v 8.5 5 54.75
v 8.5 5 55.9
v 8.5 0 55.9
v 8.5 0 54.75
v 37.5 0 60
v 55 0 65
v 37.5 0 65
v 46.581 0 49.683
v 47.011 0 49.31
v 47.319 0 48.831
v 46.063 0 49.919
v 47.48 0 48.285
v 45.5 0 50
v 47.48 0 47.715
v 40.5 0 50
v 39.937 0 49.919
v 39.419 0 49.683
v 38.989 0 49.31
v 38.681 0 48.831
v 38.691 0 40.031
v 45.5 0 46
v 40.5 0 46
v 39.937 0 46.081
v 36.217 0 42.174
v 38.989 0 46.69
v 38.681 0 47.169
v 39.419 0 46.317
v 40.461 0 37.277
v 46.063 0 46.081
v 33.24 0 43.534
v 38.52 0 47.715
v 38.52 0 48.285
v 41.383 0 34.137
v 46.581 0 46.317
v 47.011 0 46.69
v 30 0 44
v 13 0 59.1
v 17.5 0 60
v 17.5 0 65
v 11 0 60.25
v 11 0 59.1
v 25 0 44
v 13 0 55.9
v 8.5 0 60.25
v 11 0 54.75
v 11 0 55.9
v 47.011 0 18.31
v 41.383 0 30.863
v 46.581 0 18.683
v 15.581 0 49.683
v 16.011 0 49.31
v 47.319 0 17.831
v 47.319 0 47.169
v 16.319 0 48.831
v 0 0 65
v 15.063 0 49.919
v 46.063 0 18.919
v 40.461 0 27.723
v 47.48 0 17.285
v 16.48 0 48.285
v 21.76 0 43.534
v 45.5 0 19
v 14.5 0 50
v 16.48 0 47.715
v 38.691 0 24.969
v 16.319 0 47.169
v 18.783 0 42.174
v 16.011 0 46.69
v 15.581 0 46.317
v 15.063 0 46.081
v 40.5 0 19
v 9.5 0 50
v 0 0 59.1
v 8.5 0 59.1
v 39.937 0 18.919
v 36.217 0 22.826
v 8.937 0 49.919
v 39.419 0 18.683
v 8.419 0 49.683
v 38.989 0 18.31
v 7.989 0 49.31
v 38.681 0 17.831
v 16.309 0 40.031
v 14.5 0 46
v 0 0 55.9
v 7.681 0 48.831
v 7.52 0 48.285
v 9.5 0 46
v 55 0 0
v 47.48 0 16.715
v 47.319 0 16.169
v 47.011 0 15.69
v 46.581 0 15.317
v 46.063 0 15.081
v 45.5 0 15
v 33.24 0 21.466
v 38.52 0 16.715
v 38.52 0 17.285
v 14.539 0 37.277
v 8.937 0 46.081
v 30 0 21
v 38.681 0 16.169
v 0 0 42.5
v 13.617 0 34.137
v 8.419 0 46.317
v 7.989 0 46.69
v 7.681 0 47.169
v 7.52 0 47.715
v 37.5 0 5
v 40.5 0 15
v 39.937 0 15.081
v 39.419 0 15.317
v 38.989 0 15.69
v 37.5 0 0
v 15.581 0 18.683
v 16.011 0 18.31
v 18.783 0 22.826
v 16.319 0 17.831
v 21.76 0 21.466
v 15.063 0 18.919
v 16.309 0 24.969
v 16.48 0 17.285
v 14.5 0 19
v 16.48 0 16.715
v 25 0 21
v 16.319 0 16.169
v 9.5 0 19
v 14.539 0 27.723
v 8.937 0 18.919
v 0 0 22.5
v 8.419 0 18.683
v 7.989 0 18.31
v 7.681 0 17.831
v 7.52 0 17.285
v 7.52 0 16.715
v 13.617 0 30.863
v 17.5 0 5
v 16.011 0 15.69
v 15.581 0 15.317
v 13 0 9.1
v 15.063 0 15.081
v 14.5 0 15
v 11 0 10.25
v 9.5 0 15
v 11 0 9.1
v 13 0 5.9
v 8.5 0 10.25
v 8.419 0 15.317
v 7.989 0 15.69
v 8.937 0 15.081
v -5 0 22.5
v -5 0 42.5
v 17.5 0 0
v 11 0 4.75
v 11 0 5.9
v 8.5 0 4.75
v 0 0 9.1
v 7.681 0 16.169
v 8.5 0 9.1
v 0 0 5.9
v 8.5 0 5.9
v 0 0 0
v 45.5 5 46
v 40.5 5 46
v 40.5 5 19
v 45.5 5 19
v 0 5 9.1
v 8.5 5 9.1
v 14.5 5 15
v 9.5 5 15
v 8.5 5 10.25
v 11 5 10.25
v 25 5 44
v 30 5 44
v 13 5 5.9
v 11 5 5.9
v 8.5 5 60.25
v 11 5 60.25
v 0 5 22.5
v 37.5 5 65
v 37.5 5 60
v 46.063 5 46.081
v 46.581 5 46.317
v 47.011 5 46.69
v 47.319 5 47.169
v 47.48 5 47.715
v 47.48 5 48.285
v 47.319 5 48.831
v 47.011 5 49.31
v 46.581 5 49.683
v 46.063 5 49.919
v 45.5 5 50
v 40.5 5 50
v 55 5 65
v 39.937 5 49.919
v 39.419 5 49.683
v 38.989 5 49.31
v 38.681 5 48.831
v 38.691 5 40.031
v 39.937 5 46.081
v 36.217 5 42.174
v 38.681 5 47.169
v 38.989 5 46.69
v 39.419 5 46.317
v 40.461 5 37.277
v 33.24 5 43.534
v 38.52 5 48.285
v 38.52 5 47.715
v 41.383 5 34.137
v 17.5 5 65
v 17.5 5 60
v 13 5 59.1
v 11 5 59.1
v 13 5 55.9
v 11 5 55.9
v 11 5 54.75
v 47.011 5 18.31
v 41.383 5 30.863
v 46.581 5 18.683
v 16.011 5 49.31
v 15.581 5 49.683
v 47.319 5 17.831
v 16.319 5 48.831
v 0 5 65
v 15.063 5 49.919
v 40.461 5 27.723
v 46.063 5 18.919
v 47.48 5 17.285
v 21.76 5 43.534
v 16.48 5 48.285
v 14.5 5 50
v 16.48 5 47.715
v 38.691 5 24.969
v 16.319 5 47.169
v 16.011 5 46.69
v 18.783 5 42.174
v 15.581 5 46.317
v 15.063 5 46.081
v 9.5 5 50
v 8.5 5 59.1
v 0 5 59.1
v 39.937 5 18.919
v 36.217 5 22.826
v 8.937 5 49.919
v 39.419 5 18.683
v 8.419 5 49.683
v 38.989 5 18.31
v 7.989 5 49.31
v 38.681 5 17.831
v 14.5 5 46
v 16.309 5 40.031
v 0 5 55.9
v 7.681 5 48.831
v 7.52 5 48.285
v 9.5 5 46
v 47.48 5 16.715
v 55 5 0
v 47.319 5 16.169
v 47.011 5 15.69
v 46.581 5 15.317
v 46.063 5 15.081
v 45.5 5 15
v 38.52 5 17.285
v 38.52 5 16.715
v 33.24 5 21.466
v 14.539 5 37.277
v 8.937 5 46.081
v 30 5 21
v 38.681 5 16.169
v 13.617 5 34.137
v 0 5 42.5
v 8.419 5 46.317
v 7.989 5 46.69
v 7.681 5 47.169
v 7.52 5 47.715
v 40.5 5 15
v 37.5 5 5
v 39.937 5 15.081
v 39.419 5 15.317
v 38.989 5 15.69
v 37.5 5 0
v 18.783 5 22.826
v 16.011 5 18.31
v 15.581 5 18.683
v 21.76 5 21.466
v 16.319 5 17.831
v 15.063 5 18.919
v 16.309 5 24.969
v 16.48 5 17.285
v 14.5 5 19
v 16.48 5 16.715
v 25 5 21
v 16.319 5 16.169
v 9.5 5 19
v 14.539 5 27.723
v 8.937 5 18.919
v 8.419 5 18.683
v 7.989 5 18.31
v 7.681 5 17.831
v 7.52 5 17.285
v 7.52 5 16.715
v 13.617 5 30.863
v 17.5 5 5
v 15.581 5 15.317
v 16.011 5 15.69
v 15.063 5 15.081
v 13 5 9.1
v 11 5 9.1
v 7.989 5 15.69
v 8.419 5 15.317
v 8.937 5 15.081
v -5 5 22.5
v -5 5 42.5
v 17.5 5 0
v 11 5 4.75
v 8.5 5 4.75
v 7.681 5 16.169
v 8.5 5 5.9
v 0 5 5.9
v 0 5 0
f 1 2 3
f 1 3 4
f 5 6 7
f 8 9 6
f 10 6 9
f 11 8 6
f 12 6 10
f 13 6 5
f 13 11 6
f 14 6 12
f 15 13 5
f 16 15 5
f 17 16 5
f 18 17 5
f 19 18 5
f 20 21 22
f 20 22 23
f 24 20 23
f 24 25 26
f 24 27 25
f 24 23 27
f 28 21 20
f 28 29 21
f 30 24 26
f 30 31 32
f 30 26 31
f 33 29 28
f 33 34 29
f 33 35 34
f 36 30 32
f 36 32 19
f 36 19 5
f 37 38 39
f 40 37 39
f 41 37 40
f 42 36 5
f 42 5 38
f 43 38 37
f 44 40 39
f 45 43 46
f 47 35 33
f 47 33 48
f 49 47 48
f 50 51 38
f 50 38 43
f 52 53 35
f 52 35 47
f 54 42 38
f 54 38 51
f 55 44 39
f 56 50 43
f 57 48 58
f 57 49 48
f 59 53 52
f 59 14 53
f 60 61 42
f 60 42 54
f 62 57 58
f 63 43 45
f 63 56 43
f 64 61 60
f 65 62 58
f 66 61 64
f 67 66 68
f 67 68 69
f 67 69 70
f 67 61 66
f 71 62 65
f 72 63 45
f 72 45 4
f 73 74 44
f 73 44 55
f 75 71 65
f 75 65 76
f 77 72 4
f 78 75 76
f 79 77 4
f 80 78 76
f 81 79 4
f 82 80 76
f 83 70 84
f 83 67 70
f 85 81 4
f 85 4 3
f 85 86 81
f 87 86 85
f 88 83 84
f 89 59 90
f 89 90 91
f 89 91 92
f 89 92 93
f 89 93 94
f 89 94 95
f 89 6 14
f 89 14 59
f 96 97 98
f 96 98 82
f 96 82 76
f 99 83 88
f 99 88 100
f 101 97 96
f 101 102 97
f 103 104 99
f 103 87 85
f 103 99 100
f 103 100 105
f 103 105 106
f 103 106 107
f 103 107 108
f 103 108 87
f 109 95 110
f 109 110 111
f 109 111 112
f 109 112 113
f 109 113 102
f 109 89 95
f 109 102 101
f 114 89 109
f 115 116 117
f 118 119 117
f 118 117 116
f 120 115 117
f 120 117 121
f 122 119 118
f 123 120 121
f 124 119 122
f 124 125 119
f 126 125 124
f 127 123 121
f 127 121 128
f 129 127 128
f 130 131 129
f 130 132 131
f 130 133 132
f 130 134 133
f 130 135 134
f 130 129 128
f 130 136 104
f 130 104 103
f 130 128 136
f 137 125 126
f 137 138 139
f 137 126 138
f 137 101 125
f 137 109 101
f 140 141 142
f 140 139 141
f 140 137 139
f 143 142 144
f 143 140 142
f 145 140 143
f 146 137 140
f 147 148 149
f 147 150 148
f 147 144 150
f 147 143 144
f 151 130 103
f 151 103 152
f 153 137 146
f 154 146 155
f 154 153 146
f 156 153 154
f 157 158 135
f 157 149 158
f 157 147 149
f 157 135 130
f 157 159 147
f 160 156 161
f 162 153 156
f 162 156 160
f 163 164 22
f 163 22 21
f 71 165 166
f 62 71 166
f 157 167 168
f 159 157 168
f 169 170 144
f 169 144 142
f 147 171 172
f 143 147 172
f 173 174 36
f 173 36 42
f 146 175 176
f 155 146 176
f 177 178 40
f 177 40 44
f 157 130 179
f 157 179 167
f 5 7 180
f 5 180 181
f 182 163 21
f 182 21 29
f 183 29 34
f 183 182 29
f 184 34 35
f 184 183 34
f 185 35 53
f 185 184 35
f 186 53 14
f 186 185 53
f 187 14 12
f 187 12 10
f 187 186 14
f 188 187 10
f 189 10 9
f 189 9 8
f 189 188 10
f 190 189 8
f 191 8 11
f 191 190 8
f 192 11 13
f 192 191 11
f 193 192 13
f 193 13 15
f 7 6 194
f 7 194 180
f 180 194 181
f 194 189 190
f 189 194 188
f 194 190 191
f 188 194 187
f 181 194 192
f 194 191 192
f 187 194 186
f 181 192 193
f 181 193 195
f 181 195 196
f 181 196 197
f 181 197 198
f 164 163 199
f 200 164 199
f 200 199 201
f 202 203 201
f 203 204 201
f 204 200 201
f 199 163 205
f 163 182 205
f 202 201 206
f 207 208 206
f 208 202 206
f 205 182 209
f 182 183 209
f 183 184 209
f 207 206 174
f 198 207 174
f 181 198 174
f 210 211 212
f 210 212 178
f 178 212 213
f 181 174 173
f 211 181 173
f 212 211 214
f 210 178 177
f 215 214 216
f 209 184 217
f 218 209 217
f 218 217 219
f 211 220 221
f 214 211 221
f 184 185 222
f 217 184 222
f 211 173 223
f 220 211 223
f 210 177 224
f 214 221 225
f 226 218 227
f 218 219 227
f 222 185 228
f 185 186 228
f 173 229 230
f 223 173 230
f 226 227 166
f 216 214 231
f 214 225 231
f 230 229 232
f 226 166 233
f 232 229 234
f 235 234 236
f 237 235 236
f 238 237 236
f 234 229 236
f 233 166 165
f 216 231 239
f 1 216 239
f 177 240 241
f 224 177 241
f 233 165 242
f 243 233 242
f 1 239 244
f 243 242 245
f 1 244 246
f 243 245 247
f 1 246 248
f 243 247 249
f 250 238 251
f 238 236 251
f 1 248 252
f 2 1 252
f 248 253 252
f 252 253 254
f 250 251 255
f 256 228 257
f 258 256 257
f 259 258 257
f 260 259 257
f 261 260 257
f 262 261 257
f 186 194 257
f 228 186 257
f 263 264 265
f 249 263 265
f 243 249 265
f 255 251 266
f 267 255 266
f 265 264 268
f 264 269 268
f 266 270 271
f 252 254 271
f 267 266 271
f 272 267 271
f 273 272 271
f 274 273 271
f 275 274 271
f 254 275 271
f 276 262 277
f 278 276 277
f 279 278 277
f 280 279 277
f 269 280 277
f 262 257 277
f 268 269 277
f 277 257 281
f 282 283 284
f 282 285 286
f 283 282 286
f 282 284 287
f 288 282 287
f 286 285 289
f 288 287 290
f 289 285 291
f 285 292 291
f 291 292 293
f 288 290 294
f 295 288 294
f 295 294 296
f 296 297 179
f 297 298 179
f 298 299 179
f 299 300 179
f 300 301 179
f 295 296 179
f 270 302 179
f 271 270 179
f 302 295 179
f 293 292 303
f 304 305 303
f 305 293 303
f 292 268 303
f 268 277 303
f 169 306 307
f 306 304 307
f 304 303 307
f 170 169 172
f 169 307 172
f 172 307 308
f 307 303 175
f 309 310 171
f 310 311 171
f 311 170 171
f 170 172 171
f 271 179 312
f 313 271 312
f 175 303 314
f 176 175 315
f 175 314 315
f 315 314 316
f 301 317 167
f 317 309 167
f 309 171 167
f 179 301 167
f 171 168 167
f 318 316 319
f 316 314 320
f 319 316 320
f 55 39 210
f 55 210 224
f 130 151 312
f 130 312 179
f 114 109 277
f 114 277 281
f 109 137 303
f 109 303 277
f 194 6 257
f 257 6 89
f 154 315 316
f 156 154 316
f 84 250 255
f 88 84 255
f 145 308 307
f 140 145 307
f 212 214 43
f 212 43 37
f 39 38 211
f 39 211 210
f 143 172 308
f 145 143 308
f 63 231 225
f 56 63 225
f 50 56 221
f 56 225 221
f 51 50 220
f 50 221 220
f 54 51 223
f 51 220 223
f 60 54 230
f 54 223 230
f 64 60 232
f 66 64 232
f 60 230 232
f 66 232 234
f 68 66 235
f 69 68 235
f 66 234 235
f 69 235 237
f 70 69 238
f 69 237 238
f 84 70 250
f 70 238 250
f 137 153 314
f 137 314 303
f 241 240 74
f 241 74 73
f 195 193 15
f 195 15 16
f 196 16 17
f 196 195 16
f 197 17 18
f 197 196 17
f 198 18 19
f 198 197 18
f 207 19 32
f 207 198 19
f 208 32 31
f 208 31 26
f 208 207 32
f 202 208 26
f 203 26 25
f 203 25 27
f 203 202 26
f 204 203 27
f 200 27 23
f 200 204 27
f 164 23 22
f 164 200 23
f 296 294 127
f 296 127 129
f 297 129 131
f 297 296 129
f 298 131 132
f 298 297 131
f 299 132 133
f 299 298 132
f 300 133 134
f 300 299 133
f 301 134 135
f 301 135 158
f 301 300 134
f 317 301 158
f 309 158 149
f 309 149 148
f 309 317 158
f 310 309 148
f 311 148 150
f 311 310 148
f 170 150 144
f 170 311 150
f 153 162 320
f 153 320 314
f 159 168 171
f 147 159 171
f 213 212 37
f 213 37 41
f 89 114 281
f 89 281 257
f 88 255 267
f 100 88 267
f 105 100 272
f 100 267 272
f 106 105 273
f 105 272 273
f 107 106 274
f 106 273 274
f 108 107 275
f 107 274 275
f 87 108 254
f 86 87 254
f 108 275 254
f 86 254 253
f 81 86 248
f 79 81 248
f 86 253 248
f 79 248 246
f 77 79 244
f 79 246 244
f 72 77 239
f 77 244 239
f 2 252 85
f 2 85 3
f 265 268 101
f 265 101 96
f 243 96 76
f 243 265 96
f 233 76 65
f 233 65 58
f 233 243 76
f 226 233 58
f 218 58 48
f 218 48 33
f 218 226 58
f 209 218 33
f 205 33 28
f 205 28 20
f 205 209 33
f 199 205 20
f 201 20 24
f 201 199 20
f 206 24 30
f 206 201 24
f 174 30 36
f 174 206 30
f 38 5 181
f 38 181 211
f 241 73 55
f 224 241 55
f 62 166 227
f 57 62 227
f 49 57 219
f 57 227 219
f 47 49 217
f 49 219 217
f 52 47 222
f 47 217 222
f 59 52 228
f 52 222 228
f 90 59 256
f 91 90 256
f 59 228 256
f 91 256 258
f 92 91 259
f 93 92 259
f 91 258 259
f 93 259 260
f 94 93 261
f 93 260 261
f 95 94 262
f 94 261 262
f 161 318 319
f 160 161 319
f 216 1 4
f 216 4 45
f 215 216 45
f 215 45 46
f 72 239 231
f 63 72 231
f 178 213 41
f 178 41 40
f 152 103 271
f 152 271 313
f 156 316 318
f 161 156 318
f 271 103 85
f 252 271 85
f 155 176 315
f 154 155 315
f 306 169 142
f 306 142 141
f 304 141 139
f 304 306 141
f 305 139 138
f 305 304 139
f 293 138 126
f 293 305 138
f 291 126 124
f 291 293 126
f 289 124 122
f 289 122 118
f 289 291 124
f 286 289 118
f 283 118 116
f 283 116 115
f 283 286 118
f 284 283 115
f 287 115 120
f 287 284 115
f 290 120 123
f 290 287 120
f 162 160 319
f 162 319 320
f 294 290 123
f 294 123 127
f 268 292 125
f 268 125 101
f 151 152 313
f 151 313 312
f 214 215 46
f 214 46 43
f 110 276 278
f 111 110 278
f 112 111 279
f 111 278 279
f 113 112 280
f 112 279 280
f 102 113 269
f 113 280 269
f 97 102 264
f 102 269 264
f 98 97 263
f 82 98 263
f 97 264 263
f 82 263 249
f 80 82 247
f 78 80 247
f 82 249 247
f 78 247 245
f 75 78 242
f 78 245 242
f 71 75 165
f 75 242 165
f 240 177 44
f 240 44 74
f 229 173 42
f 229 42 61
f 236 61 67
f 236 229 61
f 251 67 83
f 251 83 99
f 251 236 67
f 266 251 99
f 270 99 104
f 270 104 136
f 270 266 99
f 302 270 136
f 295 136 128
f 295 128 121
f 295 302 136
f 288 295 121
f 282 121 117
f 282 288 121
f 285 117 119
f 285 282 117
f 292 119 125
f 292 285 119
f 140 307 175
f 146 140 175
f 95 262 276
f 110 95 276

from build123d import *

# Parameters (mm, degrees)
BOSS_EXTRU_1_DEPTH      = 5
ENL_V_MAT_EXTRU_1_DEPTH = 5
ENL_V_MAT_EXTRU_2_DEPTH = 5
SYM_TRIE2_COPY_1_DEPTH  = 5
ENL_V_MAT_EXTRU_3_DEPTH = 10


with BuildPart() as part:
    # Esquisse1 → Boss.-Extru.1 (new body)
    with BuildSketch(Plane(origin=(0, 0, 0), x_dir=(1, 0, 0), z_dir=(0, 1, 0))):
        Polygon((17.5, -5), (37.5, -5), (37.5, 0), (55, 0), (55, -60), (55, -65), (37.5, -65), (37.5, -60), (17.5, -60), (17.5, -65), (0, -65), (0, -60), (0, -42.5), (-5, -42.5), (-5, -22.5), (0, -22.5), (0, 0), (17.5, 0), align=None)
    extrude(amount=BOSS_EXTRU_1_DEPTH)

    # Esquisse2 → Enlèv. mat.-Extru.1 (cut)
    with BuildSketch(Plane(origin=(0, 5, 0), x_dir=(1, 0, 0), z_dir=(0, 1, 0))):
        with BuildLine():
            Line((25, -21), (30, -21))
            ThreePointArc((30, -21), (41.5, -32.5), (30, -44))
            Line((30, -44), (25, -44))
            ThreePointArc((25, -44), (13.5, -32.5), (25, -21))
        make_face()
    extrude(amount=-ENL_V_MAT_EXTRU_1_DEPTH, mode=Mode.SUBTRACT)

    # Esquisse3 → Enlèv. mat.-Extru.2 (cut)
    with BuildSketch(Plane(origin=(0, 5, 0), x_dir=(1, 0, 0), z_dir=(0, 1, 0))):
        with BuildLine():
            Line((9.5, -15), (14.5, -15))
            ThreePointArc((14.5, -15), (16.5, -17), (14.5, -19))
            Line((14.5, -19), (9.5, -19))
            ThreePointArc((9.5, -19), (7.5, -17), (9.5, -15))
        make_face()
    enl_v_mat_extru_2 = extrude(amount=-ENL_V_MAT_EXTRU_2_DEPTH, mode=Mode.SUBTRACT)

    # Symétrie1: Enlèv. mat.-Extru.2 across plane
    add(enl_v_mat_extru_2.mirror(Plane.XY.offset(32.5)), mode=Mode.SUBTRACT)

    # Symétrie2: Enlèv. mat.-Extru.2 across plane
    add(enl_v_mat_extru_2.mirror(Plane.ZY.offset(-27.5)), mode=Mode.SUBTRACT)

    # Symétrie2 copy 1 sketch → Symétrie2 copy 1 (cut)
    with BuildSketch(Plane(origin=(55, 5, 65), x_dir=(-1, 0, 0), z_dir=(0, 1, 0))):
        with BuildLine():
            Line((9.5, -15), (14.5, -15))
            ThreePointArc((14.5, -15), (16.5, -17), (14.5, -19))
            Line((14.5, -19), (9.5, -19))
            ThreePointArc((9.5, -19), (7.5, -17), (9.5, -15))
        make_face()
    extrude(amount=-SYM_TRIE2_COPY_1_DEPTH, mode=Mode.SUBTRACT)

    # Esquisse4 → Enlèv. mat.-Extru.3 (cut)
    with BuildSketch(Plane(origin=(0, 5, 0), x_dir=(1, 0, 0), z_dir=(0, 1, 0))):
        Polygon((13, -5.9), (11, -5.9), (11, -4.75), (8.5, -4.75), (8.5, -5.9), (0, -5.9), (0, -9.1), (8.5, -9.1), (8.5, -10.25), (11, -10.25), (11, -9.1), (13, -9.1), align=None)
    enl_v_mat_extru_3 = extrude(amount=-ENL_V_MAT_EXTRU_3_DEPTH, mode=Mode.SUBTRACT)

    # Symétrie3: Enlèv. mat.-Extru.3 across plane
    add(enl_v_mat_extru_3.mirror(Plane.XY.offset(32.5)), mode=Mode.SUBTRACT)


solid = part.part
